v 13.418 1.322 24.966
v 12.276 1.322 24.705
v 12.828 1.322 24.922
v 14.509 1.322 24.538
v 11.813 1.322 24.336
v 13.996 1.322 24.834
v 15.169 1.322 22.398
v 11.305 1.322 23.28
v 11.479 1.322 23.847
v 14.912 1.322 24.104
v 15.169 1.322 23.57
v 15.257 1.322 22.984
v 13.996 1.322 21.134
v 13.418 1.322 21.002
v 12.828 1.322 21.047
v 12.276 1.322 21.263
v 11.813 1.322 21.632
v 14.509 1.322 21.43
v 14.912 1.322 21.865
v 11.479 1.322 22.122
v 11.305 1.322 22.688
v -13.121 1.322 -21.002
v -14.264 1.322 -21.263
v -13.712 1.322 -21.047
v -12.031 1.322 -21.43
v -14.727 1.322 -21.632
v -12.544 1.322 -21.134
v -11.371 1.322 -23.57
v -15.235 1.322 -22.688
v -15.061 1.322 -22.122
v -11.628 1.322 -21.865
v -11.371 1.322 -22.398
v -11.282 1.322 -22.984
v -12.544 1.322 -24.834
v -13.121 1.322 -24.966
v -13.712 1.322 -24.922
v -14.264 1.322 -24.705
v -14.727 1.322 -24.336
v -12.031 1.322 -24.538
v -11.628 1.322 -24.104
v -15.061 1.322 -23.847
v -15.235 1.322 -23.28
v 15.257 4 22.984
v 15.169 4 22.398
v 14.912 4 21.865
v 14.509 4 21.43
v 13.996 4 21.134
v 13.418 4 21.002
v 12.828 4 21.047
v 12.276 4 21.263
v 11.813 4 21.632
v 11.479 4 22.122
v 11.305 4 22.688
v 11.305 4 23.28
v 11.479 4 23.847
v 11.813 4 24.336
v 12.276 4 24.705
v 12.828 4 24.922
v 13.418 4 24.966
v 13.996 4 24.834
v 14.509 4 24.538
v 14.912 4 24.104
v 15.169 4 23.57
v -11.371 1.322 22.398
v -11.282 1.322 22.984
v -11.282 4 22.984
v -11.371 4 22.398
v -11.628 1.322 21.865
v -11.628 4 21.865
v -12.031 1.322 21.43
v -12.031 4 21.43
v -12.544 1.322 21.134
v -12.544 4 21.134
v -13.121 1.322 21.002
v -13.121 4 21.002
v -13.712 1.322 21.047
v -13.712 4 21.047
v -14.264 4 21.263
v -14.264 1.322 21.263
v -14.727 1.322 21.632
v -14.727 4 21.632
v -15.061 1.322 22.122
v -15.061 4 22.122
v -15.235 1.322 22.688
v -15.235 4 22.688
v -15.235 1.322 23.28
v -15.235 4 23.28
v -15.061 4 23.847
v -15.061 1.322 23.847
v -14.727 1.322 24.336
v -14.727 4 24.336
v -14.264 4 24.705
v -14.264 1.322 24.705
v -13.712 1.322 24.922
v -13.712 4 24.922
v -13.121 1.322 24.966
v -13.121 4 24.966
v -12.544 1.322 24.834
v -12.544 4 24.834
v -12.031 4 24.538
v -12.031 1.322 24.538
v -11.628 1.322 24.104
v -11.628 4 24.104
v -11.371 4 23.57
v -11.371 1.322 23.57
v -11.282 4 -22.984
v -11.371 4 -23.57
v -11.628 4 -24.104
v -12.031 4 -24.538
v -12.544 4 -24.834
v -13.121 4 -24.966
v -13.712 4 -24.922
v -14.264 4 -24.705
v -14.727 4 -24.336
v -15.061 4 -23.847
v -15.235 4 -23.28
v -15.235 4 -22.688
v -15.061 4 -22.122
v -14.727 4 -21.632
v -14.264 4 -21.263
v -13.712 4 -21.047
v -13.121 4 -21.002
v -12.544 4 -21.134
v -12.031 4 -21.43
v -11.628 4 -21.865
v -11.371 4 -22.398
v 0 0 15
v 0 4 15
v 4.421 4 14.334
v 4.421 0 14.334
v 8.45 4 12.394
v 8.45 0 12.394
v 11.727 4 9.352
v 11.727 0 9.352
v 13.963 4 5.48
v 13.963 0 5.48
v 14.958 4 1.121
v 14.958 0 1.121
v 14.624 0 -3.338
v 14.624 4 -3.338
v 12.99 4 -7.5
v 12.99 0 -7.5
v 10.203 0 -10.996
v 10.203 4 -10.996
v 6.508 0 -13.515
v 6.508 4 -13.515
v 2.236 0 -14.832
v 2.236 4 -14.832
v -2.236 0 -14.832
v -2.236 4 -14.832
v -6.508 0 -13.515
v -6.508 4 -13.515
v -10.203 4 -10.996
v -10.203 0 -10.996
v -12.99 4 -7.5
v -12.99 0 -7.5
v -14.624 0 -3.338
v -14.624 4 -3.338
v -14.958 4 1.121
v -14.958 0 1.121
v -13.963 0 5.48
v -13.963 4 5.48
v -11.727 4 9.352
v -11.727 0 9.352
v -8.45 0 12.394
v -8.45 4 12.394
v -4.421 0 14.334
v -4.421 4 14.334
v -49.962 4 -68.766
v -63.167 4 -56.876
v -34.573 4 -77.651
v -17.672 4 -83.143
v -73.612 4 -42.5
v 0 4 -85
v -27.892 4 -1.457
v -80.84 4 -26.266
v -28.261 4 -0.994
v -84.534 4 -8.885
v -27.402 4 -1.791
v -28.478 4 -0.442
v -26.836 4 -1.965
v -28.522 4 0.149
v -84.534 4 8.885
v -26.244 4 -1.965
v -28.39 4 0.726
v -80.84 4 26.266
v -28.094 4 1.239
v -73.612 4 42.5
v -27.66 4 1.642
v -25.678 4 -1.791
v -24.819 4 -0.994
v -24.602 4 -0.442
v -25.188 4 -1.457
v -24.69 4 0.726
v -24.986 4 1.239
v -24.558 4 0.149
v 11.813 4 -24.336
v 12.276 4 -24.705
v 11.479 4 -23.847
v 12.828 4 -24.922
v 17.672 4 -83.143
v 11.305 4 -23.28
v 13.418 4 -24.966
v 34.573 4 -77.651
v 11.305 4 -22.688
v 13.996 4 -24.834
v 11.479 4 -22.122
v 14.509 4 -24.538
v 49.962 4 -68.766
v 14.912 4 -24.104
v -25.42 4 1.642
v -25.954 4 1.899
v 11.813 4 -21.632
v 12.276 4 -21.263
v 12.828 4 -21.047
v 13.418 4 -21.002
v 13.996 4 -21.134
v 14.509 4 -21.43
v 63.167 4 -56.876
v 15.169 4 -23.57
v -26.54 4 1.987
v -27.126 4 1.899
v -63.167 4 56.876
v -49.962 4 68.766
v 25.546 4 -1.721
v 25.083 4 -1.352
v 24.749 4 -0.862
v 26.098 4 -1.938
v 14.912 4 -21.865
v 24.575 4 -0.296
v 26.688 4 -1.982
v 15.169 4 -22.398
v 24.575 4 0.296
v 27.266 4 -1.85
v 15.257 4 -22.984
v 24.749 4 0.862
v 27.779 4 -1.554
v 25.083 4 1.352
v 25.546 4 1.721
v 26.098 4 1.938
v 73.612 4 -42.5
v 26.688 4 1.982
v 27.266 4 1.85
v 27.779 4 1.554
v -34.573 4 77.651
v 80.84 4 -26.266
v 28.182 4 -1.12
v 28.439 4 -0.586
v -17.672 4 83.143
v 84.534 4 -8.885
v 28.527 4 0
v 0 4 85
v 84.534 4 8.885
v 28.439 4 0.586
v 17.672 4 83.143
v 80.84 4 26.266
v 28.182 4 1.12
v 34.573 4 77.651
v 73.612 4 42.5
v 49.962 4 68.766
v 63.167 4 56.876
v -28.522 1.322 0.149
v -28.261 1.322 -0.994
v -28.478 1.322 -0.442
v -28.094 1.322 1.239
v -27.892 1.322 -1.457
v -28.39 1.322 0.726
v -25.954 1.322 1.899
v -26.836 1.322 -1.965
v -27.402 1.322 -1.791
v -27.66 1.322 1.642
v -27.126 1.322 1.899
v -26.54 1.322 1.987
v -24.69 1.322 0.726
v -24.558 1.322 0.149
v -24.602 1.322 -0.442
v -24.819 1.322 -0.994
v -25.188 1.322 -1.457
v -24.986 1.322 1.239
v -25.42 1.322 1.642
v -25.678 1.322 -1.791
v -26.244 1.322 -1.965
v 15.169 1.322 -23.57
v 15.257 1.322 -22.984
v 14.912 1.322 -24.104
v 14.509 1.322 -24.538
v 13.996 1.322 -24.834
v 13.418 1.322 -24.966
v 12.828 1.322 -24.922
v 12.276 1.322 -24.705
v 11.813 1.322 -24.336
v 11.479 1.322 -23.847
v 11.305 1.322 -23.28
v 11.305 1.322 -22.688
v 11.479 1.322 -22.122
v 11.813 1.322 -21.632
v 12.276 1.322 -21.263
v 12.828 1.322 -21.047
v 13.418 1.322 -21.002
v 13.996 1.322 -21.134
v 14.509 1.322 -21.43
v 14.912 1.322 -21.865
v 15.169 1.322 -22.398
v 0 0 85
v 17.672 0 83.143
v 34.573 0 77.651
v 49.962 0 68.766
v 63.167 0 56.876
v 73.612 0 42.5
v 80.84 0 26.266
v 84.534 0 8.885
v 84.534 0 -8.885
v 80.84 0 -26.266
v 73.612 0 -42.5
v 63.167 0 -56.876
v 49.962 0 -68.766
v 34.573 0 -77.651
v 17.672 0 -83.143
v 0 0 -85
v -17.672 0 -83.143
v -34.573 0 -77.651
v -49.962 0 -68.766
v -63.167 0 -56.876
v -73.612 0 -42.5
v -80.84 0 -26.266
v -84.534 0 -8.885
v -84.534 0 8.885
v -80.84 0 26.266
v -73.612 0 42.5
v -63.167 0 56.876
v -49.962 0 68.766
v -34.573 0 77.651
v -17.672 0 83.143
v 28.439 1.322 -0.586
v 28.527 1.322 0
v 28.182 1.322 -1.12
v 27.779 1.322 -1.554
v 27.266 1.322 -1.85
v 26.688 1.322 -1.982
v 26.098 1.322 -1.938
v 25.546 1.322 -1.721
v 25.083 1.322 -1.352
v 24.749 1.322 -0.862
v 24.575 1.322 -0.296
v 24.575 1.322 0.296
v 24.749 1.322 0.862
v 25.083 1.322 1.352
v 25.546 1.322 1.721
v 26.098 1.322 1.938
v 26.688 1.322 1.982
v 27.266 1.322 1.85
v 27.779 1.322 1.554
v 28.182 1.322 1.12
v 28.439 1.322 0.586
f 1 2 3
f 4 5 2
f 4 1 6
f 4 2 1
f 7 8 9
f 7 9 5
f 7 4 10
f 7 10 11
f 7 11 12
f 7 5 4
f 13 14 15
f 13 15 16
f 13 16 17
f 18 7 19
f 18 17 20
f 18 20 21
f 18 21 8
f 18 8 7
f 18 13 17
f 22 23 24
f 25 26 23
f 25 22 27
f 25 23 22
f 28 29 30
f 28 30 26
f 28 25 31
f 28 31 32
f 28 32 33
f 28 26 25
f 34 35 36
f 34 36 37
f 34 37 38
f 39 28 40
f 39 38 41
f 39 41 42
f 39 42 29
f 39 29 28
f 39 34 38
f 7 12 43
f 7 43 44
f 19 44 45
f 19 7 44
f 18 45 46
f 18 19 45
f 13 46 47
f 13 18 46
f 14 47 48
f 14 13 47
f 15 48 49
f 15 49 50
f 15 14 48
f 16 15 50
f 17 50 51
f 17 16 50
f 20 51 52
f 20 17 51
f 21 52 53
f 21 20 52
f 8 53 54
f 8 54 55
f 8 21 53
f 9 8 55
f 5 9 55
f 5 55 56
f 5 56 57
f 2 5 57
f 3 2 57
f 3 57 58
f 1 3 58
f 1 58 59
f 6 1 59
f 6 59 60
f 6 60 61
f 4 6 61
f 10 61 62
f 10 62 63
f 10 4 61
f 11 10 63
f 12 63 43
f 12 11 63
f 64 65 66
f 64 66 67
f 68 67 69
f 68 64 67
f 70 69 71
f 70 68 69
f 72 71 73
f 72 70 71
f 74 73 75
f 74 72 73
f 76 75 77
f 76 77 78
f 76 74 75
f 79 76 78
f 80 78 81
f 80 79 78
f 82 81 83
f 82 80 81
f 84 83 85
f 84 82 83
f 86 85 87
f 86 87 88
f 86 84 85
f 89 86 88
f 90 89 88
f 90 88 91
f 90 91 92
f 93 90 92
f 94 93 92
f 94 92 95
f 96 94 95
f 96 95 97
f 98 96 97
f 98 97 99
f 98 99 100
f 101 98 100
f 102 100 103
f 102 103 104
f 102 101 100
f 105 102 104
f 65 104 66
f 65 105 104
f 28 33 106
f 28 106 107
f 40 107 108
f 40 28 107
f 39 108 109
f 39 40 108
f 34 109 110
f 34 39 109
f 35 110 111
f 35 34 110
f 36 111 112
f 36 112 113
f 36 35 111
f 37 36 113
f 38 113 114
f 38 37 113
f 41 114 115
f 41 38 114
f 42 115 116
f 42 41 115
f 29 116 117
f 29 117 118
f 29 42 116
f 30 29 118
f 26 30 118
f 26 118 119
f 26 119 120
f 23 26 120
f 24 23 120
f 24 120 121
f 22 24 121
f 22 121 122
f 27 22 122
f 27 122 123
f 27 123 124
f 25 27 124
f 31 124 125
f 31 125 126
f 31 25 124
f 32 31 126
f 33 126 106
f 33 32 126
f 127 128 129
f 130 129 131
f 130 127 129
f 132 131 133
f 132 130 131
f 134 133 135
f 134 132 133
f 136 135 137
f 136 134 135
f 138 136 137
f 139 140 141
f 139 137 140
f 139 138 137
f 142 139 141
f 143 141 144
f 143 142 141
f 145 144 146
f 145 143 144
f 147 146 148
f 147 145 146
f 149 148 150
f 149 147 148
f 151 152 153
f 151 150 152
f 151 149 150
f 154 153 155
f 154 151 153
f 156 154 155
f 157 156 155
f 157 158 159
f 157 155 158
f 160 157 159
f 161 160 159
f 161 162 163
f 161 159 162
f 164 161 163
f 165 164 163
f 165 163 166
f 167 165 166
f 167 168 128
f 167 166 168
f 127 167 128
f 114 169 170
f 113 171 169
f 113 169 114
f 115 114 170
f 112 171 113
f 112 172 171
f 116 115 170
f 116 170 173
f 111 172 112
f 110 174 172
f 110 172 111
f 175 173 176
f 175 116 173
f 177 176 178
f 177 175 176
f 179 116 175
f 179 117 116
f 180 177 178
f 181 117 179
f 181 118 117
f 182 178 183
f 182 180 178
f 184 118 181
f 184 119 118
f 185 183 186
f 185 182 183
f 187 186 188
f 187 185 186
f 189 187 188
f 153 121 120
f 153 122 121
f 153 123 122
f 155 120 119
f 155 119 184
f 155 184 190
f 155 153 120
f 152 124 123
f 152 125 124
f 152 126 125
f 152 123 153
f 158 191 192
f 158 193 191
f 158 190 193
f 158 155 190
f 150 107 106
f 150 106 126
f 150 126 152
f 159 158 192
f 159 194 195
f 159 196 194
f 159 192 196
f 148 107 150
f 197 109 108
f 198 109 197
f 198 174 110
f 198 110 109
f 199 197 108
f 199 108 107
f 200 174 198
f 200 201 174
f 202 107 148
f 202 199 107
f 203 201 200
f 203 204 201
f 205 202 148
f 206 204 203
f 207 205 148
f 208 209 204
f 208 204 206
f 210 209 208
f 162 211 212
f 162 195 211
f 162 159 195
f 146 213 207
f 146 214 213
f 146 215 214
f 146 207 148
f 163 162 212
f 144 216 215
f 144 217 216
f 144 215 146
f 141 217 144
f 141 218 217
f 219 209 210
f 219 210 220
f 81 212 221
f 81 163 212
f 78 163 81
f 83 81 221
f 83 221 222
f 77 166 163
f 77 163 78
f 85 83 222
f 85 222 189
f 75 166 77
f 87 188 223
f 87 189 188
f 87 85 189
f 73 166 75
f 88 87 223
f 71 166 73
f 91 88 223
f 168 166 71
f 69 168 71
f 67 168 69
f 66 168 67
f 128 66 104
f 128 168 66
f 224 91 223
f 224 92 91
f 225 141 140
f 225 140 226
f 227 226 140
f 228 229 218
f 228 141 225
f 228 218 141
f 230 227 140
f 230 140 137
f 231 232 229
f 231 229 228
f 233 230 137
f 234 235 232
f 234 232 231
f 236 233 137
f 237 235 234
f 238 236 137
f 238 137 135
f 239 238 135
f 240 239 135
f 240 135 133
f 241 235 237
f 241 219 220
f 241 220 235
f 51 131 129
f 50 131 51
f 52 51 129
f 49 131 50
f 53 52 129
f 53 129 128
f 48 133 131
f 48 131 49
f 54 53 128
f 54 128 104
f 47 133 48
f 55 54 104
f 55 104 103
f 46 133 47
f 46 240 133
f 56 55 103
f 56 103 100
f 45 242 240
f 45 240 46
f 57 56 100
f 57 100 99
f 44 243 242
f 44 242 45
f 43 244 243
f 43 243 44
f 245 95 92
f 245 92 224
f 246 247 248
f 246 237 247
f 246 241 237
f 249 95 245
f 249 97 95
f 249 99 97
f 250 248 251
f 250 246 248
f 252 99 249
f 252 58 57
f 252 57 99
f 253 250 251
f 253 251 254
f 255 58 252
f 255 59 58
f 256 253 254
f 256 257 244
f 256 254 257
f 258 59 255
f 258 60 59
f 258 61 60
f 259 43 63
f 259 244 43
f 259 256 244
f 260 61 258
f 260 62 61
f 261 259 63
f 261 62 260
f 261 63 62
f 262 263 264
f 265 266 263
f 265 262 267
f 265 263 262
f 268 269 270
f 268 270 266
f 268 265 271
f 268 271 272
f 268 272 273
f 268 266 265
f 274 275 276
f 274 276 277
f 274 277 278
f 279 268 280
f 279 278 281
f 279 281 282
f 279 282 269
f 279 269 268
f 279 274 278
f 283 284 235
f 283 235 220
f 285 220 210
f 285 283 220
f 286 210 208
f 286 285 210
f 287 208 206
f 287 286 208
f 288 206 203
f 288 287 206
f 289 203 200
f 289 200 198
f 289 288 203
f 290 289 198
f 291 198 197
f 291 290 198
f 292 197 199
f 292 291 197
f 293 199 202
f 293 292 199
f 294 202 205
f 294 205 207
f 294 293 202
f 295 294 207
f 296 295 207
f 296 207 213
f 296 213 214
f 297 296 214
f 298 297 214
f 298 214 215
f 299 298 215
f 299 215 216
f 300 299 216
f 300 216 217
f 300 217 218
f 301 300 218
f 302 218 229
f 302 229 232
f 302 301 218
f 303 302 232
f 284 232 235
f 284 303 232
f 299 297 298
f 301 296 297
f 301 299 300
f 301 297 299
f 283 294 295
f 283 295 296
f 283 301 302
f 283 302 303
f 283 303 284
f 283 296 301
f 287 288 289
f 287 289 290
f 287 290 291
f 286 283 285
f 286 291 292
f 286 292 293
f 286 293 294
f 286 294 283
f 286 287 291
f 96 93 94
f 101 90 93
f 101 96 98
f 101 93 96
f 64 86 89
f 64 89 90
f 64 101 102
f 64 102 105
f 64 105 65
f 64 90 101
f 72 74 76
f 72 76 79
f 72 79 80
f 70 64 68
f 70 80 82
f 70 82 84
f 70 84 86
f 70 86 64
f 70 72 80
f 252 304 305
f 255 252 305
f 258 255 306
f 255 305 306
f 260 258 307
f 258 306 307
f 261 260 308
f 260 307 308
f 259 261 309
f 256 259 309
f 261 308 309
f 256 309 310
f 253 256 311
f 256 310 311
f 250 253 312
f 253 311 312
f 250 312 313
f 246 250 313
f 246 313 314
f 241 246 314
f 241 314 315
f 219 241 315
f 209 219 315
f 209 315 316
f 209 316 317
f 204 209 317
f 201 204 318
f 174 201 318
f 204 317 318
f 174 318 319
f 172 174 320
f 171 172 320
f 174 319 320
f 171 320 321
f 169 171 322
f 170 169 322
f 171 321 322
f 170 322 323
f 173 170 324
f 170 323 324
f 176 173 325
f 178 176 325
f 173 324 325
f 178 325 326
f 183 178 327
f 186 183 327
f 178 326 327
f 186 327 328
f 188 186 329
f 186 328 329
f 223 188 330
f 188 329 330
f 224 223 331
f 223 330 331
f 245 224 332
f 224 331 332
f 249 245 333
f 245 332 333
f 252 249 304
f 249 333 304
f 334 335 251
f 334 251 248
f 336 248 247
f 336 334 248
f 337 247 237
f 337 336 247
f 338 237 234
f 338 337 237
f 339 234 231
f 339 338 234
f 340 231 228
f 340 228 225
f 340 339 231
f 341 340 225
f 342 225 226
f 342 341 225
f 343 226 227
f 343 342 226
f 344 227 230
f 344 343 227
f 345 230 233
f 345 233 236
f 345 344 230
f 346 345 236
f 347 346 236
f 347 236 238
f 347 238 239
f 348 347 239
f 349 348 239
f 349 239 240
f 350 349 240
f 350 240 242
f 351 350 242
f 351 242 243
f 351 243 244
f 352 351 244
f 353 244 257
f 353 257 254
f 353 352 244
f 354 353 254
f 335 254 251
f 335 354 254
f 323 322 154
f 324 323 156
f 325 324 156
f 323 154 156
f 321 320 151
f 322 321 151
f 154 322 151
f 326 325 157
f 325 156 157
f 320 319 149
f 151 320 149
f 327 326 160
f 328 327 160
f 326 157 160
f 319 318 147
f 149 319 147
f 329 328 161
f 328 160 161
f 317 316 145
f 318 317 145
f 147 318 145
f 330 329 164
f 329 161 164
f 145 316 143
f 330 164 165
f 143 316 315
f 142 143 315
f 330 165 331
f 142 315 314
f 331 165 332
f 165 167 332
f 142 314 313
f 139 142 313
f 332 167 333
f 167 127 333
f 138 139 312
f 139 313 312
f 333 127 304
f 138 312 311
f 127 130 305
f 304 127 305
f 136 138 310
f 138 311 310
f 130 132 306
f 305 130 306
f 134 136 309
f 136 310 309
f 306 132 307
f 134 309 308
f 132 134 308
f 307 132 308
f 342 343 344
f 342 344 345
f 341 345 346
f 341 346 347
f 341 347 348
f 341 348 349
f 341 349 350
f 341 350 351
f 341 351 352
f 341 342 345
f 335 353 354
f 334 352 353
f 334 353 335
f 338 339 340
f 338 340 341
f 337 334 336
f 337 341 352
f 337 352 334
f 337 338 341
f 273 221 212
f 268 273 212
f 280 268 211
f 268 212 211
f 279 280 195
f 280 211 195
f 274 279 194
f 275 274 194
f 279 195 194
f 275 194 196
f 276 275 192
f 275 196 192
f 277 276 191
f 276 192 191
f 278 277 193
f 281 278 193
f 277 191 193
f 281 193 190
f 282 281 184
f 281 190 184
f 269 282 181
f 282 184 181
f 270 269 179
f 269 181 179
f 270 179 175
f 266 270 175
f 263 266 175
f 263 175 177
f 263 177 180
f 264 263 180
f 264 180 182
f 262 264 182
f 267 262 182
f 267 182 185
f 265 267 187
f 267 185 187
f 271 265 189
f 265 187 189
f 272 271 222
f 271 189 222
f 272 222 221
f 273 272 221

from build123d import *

# Parameters (mm, degrees)
SKETCH1_R           = 85
BOSS_EXTRUDE1_DEPTH = 4
SKETCH2_R           = 15
CUT_EXTRUDE1_DEPTH  = 121.274685616
SKETCH3_R           = 1.987487824
CUT_EXTRUDE2_DEPTH  = 2.677604017
CIRPATTERN1_COUNT   = 6


with BuildPart() as part:
    # Sketch1 → Boss-Extrude1 (new body)
    with BuildSketch(Plane(origin=(0, 0, 0), x_dir=(1, 0, 0), z_dir=(0, 1, 0))):
        Circle(SKETCH1_R)
    extrude(amount=BOSS_EXTRUDE1_DEPTH)

    # Sketch2 → Cut-Extrude1 (cut, through all)
    with BuildSketch(Plane(origin=(0, 0, 0), x_dir=(1, 0, 0), z_dir=(0, 1, 0))):
        Circle(SKETCH2_R)
    extrude(amount=CUT_EXTRUDE1_DEPTH, mode=Mode.SUBTRACT)

    # Sketch3 → Cut-Extrude2 (cut)
    with BuildSketch(Plane(origin=(0, 4, 0), x_dir=(1, 0, 0), z_dir=(0, 1, 0))):
        with Locations((-26.539929768, 0)):
            Circle(SKETCH3_R)
    cut_extrude2 = extrude(amount=-CUT_EXTRUDE2_DEPTH, mode=Mode.SUBTRACT)

    # CirPattern1: Cut-Extrude2 ×6 about axis
    cirpattern1_axis = Axis((0, 0, 0), (0, 1, 0))
    for i in range(1, CIRPATTERN1_COUNT):
        add(cut_extrude2.rotate(cirpattern1_axis, i * 360 / CIRPATTERN1_COUNT), mode=Mode.SUBTRACT)


solid = part.part
